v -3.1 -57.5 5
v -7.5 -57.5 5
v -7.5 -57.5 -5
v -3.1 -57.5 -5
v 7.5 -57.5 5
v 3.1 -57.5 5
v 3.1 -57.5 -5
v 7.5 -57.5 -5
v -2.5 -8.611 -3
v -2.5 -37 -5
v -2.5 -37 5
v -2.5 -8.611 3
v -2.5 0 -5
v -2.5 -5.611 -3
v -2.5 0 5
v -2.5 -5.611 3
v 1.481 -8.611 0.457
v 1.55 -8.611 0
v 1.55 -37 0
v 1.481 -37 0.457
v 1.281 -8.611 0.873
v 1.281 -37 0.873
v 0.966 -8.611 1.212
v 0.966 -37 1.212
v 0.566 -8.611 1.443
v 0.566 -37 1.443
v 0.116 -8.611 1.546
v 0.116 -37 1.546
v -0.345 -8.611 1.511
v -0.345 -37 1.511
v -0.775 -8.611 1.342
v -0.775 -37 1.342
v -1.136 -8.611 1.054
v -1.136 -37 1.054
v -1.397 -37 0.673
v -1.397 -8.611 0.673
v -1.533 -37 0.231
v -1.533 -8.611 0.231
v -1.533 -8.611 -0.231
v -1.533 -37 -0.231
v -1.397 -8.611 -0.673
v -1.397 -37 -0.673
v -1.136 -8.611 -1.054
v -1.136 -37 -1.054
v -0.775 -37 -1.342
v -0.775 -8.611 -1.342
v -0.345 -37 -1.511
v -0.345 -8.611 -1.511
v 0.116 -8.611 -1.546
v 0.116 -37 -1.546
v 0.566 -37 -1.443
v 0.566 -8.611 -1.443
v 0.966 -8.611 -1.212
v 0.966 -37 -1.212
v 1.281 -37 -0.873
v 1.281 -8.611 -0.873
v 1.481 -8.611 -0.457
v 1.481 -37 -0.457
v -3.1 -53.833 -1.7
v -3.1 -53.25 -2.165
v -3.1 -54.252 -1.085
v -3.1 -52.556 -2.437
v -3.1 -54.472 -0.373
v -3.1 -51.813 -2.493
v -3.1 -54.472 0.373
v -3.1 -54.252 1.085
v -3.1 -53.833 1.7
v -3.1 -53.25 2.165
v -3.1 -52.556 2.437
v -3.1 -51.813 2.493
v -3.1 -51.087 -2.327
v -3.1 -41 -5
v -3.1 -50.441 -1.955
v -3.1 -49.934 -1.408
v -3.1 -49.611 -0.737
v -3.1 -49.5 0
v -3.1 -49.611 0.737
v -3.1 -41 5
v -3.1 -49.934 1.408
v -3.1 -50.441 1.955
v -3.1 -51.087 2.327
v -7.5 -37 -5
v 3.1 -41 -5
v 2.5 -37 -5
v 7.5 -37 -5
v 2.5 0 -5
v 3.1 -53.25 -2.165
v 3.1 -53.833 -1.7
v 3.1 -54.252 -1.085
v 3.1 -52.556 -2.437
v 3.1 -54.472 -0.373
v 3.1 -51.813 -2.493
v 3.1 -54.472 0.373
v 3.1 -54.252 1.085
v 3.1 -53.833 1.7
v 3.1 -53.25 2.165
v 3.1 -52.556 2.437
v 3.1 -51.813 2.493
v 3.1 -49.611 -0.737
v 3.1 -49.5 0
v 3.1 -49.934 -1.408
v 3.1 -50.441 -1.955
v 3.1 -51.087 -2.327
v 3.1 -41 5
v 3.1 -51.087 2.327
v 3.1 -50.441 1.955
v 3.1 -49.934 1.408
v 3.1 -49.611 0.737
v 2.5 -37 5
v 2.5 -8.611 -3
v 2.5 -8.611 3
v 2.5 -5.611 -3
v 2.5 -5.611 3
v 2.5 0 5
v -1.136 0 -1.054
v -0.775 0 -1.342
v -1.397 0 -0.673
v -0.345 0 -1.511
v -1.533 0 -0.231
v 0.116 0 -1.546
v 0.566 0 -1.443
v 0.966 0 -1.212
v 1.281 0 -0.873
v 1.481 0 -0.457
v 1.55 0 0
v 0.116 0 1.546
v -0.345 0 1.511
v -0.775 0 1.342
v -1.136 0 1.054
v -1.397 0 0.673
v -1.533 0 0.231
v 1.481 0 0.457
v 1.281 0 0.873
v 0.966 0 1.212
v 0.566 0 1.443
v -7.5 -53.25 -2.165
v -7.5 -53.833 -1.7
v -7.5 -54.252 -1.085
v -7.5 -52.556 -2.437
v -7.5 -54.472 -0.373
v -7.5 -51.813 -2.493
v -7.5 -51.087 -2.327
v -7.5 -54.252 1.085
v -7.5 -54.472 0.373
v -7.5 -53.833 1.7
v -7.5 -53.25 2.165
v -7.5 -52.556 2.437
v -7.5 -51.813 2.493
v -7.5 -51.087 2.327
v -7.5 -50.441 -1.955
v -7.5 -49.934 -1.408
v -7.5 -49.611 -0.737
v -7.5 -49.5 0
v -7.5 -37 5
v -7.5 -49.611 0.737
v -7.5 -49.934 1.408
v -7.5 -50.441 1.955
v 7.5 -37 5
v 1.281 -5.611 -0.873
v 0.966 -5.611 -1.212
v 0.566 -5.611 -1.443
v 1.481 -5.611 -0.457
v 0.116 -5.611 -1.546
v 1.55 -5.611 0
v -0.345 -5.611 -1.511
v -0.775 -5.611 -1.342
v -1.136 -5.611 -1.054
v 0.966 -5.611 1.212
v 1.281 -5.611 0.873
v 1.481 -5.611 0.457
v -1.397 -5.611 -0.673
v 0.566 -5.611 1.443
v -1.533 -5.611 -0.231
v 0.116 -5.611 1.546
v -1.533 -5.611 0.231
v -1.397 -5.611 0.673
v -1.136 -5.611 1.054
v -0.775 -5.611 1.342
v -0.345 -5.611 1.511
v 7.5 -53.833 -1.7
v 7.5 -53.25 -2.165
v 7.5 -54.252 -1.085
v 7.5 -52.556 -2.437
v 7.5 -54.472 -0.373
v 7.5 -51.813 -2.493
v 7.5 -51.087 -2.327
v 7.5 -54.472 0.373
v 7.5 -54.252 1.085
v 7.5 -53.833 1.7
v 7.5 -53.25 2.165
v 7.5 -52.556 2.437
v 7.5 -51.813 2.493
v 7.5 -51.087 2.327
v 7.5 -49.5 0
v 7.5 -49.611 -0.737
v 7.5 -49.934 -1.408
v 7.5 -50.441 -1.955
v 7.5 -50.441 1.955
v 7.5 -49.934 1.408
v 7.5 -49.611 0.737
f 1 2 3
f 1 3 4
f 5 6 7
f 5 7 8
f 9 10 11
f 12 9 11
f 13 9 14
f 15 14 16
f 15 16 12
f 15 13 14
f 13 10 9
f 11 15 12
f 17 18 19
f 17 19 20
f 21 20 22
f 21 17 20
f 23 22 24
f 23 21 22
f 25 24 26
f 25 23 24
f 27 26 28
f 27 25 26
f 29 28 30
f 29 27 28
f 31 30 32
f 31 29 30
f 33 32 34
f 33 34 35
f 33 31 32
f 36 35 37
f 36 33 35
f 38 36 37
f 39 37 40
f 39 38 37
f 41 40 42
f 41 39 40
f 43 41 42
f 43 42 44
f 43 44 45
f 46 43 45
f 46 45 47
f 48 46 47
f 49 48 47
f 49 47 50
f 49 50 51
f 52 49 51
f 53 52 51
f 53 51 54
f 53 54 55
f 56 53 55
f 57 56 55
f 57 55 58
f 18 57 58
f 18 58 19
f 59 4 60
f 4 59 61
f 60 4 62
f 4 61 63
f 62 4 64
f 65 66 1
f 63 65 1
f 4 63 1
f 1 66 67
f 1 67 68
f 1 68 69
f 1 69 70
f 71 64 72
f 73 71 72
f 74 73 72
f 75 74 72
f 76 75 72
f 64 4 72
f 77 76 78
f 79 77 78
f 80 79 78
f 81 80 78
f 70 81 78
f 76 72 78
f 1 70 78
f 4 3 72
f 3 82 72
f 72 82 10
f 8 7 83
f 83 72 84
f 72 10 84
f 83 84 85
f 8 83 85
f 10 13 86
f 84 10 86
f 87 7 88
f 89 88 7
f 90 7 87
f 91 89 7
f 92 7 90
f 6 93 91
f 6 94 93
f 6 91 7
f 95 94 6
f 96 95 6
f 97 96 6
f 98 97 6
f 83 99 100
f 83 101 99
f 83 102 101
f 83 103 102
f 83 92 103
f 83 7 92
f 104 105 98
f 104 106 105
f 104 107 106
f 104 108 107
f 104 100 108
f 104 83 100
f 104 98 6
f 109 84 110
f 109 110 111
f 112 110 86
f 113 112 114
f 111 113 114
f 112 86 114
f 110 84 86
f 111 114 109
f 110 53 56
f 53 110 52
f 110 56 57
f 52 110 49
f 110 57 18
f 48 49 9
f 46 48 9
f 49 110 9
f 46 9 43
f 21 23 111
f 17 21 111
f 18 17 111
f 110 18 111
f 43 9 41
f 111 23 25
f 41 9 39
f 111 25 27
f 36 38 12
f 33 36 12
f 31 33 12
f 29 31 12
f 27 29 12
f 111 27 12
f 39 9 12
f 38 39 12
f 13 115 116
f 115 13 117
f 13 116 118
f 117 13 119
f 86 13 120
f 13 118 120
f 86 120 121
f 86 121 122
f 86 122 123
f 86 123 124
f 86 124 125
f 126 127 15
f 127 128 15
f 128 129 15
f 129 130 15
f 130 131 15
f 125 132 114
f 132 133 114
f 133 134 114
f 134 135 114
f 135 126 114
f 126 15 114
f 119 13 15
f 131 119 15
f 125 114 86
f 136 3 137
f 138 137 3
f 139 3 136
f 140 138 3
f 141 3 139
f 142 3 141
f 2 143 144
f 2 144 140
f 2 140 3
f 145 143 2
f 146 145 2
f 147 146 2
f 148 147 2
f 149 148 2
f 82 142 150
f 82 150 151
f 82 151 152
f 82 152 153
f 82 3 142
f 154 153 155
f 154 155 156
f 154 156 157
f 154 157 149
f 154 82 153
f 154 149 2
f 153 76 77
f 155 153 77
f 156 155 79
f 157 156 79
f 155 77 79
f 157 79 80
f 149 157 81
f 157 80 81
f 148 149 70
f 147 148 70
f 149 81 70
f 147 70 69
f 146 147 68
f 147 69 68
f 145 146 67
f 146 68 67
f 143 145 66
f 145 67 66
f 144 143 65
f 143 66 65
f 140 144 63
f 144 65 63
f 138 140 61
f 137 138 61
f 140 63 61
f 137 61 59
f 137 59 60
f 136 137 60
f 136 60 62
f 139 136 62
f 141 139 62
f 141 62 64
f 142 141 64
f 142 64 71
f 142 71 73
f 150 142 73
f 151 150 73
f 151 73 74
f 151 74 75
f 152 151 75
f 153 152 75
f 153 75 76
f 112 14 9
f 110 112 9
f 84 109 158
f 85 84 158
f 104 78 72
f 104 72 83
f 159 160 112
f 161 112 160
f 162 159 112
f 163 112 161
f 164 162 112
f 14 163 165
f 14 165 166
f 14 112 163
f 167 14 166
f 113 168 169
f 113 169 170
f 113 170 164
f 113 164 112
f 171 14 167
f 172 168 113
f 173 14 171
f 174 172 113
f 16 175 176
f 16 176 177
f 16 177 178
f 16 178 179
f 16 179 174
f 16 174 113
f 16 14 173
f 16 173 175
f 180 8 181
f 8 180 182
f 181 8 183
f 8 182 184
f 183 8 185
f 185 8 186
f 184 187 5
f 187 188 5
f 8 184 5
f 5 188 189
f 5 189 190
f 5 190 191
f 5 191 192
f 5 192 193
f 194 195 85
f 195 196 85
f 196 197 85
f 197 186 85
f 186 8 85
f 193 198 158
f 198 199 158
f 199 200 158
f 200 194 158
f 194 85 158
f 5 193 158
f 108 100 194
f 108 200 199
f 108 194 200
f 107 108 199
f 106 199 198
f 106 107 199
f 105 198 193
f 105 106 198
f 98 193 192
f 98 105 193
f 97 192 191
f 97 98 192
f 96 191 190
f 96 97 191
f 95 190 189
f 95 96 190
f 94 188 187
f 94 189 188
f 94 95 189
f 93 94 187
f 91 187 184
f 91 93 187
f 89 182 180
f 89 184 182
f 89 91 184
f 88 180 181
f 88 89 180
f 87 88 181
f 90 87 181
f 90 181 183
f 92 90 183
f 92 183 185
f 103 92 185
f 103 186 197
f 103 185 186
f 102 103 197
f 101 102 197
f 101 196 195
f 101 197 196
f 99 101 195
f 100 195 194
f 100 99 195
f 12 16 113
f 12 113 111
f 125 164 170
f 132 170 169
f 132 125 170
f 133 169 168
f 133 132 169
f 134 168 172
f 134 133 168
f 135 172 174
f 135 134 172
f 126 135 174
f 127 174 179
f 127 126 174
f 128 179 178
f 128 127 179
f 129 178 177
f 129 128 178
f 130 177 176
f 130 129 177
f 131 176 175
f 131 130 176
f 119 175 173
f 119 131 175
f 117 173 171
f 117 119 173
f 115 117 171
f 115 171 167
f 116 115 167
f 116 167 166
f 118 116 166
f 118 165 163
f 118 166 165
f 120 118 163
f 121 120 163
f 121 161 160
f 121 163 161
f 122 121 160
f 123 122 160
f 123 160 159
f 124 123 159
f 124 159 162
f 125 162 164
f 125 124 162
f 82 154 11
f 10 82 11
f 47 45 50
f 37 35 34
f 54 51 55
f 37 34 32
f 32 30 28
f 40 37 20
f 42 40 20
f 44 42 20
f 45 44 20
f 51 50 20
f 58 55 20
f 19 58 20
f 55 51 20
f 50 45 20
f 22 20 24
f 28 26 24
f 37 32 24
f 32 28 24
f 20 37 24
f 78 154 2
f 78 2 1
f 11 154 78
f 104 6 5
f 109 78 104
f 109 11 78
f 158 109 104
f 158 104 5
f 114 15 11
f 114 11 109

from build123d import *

# Parameters (mm, degrees)
F0_W          = 5
F0_H          = 10
F0_R          = 1.55
F1_DEPTH      = 37
F2_W          = 15
F2_H          = 10
F3_DEPTH      = 4
F4_W          = 4.4
F4_H          = 10
F5_DEPTH      = 16.5
F6_R          = 2.5
F7_DEPTH      = 4.401
F7_DEPTH_BACK = 10.601
F8_W          = 3
F8_H          = 6
F9_DEPTH      = 10.001


# Not quite as in the source:
# - a feature names something its author has since deleted; it is built from what else it names


with BuildPart() as f1:
    # F0 (on Front) → F1 (new body)
    with BuildSketch(Plane.XZ):
        Rectangle(F0_W, F0_H)
        Circle(F0_R, mode=Mode.SUBTRACT)
    extrude(amount=F1_DEPTH)

    # F2 (on face) → F3 (join)
    with BuildSketch(Plane.XZ.offset(37)):
        Rectangle(F2_W, F2_H)
    extrude(amount=F3_DEPTH)

    # F4 (on face) → F5 (join)
    with BuildSketch(Plane.XZ.offset(41)):
        with Locations((-5.3, 0)):
            Rectangle(F4_W, F4_H)
        with Locations((5.3, 0)):
            Rectangle(F4_W, F4_H)
    extrude(amount=F5_DEPTH)

    # F6 (on face) → F7 (cut, two sides)
    with BuildSketch(Plane.YZ.offset(-3.1)) as f7_sk:
        with Locations((-52, 0)):
            Circle(F6_R)
    extrude(amount=-F7_DEPTH, mode=Mode.SUBTRACT)
    extrude(f7_sk.sketch, amount=F7_DEPTH_BACK, mode=Mode.SUBTRACT)

    # F8 (on face) → F9 (cut, through all)
    with BuildSketch(Plane(origin=(-2.5, 0, 0), x_dir=(0, -1, 0), z_dir=(-1, 0, 0))):
        with Locations((7.1113700978, 0)):
            Rectangle(F8_W, F8_H)
    extrude(amount=-F9_DEPTH, mode=Mode.SUBTRACT)


solid = f1.part
